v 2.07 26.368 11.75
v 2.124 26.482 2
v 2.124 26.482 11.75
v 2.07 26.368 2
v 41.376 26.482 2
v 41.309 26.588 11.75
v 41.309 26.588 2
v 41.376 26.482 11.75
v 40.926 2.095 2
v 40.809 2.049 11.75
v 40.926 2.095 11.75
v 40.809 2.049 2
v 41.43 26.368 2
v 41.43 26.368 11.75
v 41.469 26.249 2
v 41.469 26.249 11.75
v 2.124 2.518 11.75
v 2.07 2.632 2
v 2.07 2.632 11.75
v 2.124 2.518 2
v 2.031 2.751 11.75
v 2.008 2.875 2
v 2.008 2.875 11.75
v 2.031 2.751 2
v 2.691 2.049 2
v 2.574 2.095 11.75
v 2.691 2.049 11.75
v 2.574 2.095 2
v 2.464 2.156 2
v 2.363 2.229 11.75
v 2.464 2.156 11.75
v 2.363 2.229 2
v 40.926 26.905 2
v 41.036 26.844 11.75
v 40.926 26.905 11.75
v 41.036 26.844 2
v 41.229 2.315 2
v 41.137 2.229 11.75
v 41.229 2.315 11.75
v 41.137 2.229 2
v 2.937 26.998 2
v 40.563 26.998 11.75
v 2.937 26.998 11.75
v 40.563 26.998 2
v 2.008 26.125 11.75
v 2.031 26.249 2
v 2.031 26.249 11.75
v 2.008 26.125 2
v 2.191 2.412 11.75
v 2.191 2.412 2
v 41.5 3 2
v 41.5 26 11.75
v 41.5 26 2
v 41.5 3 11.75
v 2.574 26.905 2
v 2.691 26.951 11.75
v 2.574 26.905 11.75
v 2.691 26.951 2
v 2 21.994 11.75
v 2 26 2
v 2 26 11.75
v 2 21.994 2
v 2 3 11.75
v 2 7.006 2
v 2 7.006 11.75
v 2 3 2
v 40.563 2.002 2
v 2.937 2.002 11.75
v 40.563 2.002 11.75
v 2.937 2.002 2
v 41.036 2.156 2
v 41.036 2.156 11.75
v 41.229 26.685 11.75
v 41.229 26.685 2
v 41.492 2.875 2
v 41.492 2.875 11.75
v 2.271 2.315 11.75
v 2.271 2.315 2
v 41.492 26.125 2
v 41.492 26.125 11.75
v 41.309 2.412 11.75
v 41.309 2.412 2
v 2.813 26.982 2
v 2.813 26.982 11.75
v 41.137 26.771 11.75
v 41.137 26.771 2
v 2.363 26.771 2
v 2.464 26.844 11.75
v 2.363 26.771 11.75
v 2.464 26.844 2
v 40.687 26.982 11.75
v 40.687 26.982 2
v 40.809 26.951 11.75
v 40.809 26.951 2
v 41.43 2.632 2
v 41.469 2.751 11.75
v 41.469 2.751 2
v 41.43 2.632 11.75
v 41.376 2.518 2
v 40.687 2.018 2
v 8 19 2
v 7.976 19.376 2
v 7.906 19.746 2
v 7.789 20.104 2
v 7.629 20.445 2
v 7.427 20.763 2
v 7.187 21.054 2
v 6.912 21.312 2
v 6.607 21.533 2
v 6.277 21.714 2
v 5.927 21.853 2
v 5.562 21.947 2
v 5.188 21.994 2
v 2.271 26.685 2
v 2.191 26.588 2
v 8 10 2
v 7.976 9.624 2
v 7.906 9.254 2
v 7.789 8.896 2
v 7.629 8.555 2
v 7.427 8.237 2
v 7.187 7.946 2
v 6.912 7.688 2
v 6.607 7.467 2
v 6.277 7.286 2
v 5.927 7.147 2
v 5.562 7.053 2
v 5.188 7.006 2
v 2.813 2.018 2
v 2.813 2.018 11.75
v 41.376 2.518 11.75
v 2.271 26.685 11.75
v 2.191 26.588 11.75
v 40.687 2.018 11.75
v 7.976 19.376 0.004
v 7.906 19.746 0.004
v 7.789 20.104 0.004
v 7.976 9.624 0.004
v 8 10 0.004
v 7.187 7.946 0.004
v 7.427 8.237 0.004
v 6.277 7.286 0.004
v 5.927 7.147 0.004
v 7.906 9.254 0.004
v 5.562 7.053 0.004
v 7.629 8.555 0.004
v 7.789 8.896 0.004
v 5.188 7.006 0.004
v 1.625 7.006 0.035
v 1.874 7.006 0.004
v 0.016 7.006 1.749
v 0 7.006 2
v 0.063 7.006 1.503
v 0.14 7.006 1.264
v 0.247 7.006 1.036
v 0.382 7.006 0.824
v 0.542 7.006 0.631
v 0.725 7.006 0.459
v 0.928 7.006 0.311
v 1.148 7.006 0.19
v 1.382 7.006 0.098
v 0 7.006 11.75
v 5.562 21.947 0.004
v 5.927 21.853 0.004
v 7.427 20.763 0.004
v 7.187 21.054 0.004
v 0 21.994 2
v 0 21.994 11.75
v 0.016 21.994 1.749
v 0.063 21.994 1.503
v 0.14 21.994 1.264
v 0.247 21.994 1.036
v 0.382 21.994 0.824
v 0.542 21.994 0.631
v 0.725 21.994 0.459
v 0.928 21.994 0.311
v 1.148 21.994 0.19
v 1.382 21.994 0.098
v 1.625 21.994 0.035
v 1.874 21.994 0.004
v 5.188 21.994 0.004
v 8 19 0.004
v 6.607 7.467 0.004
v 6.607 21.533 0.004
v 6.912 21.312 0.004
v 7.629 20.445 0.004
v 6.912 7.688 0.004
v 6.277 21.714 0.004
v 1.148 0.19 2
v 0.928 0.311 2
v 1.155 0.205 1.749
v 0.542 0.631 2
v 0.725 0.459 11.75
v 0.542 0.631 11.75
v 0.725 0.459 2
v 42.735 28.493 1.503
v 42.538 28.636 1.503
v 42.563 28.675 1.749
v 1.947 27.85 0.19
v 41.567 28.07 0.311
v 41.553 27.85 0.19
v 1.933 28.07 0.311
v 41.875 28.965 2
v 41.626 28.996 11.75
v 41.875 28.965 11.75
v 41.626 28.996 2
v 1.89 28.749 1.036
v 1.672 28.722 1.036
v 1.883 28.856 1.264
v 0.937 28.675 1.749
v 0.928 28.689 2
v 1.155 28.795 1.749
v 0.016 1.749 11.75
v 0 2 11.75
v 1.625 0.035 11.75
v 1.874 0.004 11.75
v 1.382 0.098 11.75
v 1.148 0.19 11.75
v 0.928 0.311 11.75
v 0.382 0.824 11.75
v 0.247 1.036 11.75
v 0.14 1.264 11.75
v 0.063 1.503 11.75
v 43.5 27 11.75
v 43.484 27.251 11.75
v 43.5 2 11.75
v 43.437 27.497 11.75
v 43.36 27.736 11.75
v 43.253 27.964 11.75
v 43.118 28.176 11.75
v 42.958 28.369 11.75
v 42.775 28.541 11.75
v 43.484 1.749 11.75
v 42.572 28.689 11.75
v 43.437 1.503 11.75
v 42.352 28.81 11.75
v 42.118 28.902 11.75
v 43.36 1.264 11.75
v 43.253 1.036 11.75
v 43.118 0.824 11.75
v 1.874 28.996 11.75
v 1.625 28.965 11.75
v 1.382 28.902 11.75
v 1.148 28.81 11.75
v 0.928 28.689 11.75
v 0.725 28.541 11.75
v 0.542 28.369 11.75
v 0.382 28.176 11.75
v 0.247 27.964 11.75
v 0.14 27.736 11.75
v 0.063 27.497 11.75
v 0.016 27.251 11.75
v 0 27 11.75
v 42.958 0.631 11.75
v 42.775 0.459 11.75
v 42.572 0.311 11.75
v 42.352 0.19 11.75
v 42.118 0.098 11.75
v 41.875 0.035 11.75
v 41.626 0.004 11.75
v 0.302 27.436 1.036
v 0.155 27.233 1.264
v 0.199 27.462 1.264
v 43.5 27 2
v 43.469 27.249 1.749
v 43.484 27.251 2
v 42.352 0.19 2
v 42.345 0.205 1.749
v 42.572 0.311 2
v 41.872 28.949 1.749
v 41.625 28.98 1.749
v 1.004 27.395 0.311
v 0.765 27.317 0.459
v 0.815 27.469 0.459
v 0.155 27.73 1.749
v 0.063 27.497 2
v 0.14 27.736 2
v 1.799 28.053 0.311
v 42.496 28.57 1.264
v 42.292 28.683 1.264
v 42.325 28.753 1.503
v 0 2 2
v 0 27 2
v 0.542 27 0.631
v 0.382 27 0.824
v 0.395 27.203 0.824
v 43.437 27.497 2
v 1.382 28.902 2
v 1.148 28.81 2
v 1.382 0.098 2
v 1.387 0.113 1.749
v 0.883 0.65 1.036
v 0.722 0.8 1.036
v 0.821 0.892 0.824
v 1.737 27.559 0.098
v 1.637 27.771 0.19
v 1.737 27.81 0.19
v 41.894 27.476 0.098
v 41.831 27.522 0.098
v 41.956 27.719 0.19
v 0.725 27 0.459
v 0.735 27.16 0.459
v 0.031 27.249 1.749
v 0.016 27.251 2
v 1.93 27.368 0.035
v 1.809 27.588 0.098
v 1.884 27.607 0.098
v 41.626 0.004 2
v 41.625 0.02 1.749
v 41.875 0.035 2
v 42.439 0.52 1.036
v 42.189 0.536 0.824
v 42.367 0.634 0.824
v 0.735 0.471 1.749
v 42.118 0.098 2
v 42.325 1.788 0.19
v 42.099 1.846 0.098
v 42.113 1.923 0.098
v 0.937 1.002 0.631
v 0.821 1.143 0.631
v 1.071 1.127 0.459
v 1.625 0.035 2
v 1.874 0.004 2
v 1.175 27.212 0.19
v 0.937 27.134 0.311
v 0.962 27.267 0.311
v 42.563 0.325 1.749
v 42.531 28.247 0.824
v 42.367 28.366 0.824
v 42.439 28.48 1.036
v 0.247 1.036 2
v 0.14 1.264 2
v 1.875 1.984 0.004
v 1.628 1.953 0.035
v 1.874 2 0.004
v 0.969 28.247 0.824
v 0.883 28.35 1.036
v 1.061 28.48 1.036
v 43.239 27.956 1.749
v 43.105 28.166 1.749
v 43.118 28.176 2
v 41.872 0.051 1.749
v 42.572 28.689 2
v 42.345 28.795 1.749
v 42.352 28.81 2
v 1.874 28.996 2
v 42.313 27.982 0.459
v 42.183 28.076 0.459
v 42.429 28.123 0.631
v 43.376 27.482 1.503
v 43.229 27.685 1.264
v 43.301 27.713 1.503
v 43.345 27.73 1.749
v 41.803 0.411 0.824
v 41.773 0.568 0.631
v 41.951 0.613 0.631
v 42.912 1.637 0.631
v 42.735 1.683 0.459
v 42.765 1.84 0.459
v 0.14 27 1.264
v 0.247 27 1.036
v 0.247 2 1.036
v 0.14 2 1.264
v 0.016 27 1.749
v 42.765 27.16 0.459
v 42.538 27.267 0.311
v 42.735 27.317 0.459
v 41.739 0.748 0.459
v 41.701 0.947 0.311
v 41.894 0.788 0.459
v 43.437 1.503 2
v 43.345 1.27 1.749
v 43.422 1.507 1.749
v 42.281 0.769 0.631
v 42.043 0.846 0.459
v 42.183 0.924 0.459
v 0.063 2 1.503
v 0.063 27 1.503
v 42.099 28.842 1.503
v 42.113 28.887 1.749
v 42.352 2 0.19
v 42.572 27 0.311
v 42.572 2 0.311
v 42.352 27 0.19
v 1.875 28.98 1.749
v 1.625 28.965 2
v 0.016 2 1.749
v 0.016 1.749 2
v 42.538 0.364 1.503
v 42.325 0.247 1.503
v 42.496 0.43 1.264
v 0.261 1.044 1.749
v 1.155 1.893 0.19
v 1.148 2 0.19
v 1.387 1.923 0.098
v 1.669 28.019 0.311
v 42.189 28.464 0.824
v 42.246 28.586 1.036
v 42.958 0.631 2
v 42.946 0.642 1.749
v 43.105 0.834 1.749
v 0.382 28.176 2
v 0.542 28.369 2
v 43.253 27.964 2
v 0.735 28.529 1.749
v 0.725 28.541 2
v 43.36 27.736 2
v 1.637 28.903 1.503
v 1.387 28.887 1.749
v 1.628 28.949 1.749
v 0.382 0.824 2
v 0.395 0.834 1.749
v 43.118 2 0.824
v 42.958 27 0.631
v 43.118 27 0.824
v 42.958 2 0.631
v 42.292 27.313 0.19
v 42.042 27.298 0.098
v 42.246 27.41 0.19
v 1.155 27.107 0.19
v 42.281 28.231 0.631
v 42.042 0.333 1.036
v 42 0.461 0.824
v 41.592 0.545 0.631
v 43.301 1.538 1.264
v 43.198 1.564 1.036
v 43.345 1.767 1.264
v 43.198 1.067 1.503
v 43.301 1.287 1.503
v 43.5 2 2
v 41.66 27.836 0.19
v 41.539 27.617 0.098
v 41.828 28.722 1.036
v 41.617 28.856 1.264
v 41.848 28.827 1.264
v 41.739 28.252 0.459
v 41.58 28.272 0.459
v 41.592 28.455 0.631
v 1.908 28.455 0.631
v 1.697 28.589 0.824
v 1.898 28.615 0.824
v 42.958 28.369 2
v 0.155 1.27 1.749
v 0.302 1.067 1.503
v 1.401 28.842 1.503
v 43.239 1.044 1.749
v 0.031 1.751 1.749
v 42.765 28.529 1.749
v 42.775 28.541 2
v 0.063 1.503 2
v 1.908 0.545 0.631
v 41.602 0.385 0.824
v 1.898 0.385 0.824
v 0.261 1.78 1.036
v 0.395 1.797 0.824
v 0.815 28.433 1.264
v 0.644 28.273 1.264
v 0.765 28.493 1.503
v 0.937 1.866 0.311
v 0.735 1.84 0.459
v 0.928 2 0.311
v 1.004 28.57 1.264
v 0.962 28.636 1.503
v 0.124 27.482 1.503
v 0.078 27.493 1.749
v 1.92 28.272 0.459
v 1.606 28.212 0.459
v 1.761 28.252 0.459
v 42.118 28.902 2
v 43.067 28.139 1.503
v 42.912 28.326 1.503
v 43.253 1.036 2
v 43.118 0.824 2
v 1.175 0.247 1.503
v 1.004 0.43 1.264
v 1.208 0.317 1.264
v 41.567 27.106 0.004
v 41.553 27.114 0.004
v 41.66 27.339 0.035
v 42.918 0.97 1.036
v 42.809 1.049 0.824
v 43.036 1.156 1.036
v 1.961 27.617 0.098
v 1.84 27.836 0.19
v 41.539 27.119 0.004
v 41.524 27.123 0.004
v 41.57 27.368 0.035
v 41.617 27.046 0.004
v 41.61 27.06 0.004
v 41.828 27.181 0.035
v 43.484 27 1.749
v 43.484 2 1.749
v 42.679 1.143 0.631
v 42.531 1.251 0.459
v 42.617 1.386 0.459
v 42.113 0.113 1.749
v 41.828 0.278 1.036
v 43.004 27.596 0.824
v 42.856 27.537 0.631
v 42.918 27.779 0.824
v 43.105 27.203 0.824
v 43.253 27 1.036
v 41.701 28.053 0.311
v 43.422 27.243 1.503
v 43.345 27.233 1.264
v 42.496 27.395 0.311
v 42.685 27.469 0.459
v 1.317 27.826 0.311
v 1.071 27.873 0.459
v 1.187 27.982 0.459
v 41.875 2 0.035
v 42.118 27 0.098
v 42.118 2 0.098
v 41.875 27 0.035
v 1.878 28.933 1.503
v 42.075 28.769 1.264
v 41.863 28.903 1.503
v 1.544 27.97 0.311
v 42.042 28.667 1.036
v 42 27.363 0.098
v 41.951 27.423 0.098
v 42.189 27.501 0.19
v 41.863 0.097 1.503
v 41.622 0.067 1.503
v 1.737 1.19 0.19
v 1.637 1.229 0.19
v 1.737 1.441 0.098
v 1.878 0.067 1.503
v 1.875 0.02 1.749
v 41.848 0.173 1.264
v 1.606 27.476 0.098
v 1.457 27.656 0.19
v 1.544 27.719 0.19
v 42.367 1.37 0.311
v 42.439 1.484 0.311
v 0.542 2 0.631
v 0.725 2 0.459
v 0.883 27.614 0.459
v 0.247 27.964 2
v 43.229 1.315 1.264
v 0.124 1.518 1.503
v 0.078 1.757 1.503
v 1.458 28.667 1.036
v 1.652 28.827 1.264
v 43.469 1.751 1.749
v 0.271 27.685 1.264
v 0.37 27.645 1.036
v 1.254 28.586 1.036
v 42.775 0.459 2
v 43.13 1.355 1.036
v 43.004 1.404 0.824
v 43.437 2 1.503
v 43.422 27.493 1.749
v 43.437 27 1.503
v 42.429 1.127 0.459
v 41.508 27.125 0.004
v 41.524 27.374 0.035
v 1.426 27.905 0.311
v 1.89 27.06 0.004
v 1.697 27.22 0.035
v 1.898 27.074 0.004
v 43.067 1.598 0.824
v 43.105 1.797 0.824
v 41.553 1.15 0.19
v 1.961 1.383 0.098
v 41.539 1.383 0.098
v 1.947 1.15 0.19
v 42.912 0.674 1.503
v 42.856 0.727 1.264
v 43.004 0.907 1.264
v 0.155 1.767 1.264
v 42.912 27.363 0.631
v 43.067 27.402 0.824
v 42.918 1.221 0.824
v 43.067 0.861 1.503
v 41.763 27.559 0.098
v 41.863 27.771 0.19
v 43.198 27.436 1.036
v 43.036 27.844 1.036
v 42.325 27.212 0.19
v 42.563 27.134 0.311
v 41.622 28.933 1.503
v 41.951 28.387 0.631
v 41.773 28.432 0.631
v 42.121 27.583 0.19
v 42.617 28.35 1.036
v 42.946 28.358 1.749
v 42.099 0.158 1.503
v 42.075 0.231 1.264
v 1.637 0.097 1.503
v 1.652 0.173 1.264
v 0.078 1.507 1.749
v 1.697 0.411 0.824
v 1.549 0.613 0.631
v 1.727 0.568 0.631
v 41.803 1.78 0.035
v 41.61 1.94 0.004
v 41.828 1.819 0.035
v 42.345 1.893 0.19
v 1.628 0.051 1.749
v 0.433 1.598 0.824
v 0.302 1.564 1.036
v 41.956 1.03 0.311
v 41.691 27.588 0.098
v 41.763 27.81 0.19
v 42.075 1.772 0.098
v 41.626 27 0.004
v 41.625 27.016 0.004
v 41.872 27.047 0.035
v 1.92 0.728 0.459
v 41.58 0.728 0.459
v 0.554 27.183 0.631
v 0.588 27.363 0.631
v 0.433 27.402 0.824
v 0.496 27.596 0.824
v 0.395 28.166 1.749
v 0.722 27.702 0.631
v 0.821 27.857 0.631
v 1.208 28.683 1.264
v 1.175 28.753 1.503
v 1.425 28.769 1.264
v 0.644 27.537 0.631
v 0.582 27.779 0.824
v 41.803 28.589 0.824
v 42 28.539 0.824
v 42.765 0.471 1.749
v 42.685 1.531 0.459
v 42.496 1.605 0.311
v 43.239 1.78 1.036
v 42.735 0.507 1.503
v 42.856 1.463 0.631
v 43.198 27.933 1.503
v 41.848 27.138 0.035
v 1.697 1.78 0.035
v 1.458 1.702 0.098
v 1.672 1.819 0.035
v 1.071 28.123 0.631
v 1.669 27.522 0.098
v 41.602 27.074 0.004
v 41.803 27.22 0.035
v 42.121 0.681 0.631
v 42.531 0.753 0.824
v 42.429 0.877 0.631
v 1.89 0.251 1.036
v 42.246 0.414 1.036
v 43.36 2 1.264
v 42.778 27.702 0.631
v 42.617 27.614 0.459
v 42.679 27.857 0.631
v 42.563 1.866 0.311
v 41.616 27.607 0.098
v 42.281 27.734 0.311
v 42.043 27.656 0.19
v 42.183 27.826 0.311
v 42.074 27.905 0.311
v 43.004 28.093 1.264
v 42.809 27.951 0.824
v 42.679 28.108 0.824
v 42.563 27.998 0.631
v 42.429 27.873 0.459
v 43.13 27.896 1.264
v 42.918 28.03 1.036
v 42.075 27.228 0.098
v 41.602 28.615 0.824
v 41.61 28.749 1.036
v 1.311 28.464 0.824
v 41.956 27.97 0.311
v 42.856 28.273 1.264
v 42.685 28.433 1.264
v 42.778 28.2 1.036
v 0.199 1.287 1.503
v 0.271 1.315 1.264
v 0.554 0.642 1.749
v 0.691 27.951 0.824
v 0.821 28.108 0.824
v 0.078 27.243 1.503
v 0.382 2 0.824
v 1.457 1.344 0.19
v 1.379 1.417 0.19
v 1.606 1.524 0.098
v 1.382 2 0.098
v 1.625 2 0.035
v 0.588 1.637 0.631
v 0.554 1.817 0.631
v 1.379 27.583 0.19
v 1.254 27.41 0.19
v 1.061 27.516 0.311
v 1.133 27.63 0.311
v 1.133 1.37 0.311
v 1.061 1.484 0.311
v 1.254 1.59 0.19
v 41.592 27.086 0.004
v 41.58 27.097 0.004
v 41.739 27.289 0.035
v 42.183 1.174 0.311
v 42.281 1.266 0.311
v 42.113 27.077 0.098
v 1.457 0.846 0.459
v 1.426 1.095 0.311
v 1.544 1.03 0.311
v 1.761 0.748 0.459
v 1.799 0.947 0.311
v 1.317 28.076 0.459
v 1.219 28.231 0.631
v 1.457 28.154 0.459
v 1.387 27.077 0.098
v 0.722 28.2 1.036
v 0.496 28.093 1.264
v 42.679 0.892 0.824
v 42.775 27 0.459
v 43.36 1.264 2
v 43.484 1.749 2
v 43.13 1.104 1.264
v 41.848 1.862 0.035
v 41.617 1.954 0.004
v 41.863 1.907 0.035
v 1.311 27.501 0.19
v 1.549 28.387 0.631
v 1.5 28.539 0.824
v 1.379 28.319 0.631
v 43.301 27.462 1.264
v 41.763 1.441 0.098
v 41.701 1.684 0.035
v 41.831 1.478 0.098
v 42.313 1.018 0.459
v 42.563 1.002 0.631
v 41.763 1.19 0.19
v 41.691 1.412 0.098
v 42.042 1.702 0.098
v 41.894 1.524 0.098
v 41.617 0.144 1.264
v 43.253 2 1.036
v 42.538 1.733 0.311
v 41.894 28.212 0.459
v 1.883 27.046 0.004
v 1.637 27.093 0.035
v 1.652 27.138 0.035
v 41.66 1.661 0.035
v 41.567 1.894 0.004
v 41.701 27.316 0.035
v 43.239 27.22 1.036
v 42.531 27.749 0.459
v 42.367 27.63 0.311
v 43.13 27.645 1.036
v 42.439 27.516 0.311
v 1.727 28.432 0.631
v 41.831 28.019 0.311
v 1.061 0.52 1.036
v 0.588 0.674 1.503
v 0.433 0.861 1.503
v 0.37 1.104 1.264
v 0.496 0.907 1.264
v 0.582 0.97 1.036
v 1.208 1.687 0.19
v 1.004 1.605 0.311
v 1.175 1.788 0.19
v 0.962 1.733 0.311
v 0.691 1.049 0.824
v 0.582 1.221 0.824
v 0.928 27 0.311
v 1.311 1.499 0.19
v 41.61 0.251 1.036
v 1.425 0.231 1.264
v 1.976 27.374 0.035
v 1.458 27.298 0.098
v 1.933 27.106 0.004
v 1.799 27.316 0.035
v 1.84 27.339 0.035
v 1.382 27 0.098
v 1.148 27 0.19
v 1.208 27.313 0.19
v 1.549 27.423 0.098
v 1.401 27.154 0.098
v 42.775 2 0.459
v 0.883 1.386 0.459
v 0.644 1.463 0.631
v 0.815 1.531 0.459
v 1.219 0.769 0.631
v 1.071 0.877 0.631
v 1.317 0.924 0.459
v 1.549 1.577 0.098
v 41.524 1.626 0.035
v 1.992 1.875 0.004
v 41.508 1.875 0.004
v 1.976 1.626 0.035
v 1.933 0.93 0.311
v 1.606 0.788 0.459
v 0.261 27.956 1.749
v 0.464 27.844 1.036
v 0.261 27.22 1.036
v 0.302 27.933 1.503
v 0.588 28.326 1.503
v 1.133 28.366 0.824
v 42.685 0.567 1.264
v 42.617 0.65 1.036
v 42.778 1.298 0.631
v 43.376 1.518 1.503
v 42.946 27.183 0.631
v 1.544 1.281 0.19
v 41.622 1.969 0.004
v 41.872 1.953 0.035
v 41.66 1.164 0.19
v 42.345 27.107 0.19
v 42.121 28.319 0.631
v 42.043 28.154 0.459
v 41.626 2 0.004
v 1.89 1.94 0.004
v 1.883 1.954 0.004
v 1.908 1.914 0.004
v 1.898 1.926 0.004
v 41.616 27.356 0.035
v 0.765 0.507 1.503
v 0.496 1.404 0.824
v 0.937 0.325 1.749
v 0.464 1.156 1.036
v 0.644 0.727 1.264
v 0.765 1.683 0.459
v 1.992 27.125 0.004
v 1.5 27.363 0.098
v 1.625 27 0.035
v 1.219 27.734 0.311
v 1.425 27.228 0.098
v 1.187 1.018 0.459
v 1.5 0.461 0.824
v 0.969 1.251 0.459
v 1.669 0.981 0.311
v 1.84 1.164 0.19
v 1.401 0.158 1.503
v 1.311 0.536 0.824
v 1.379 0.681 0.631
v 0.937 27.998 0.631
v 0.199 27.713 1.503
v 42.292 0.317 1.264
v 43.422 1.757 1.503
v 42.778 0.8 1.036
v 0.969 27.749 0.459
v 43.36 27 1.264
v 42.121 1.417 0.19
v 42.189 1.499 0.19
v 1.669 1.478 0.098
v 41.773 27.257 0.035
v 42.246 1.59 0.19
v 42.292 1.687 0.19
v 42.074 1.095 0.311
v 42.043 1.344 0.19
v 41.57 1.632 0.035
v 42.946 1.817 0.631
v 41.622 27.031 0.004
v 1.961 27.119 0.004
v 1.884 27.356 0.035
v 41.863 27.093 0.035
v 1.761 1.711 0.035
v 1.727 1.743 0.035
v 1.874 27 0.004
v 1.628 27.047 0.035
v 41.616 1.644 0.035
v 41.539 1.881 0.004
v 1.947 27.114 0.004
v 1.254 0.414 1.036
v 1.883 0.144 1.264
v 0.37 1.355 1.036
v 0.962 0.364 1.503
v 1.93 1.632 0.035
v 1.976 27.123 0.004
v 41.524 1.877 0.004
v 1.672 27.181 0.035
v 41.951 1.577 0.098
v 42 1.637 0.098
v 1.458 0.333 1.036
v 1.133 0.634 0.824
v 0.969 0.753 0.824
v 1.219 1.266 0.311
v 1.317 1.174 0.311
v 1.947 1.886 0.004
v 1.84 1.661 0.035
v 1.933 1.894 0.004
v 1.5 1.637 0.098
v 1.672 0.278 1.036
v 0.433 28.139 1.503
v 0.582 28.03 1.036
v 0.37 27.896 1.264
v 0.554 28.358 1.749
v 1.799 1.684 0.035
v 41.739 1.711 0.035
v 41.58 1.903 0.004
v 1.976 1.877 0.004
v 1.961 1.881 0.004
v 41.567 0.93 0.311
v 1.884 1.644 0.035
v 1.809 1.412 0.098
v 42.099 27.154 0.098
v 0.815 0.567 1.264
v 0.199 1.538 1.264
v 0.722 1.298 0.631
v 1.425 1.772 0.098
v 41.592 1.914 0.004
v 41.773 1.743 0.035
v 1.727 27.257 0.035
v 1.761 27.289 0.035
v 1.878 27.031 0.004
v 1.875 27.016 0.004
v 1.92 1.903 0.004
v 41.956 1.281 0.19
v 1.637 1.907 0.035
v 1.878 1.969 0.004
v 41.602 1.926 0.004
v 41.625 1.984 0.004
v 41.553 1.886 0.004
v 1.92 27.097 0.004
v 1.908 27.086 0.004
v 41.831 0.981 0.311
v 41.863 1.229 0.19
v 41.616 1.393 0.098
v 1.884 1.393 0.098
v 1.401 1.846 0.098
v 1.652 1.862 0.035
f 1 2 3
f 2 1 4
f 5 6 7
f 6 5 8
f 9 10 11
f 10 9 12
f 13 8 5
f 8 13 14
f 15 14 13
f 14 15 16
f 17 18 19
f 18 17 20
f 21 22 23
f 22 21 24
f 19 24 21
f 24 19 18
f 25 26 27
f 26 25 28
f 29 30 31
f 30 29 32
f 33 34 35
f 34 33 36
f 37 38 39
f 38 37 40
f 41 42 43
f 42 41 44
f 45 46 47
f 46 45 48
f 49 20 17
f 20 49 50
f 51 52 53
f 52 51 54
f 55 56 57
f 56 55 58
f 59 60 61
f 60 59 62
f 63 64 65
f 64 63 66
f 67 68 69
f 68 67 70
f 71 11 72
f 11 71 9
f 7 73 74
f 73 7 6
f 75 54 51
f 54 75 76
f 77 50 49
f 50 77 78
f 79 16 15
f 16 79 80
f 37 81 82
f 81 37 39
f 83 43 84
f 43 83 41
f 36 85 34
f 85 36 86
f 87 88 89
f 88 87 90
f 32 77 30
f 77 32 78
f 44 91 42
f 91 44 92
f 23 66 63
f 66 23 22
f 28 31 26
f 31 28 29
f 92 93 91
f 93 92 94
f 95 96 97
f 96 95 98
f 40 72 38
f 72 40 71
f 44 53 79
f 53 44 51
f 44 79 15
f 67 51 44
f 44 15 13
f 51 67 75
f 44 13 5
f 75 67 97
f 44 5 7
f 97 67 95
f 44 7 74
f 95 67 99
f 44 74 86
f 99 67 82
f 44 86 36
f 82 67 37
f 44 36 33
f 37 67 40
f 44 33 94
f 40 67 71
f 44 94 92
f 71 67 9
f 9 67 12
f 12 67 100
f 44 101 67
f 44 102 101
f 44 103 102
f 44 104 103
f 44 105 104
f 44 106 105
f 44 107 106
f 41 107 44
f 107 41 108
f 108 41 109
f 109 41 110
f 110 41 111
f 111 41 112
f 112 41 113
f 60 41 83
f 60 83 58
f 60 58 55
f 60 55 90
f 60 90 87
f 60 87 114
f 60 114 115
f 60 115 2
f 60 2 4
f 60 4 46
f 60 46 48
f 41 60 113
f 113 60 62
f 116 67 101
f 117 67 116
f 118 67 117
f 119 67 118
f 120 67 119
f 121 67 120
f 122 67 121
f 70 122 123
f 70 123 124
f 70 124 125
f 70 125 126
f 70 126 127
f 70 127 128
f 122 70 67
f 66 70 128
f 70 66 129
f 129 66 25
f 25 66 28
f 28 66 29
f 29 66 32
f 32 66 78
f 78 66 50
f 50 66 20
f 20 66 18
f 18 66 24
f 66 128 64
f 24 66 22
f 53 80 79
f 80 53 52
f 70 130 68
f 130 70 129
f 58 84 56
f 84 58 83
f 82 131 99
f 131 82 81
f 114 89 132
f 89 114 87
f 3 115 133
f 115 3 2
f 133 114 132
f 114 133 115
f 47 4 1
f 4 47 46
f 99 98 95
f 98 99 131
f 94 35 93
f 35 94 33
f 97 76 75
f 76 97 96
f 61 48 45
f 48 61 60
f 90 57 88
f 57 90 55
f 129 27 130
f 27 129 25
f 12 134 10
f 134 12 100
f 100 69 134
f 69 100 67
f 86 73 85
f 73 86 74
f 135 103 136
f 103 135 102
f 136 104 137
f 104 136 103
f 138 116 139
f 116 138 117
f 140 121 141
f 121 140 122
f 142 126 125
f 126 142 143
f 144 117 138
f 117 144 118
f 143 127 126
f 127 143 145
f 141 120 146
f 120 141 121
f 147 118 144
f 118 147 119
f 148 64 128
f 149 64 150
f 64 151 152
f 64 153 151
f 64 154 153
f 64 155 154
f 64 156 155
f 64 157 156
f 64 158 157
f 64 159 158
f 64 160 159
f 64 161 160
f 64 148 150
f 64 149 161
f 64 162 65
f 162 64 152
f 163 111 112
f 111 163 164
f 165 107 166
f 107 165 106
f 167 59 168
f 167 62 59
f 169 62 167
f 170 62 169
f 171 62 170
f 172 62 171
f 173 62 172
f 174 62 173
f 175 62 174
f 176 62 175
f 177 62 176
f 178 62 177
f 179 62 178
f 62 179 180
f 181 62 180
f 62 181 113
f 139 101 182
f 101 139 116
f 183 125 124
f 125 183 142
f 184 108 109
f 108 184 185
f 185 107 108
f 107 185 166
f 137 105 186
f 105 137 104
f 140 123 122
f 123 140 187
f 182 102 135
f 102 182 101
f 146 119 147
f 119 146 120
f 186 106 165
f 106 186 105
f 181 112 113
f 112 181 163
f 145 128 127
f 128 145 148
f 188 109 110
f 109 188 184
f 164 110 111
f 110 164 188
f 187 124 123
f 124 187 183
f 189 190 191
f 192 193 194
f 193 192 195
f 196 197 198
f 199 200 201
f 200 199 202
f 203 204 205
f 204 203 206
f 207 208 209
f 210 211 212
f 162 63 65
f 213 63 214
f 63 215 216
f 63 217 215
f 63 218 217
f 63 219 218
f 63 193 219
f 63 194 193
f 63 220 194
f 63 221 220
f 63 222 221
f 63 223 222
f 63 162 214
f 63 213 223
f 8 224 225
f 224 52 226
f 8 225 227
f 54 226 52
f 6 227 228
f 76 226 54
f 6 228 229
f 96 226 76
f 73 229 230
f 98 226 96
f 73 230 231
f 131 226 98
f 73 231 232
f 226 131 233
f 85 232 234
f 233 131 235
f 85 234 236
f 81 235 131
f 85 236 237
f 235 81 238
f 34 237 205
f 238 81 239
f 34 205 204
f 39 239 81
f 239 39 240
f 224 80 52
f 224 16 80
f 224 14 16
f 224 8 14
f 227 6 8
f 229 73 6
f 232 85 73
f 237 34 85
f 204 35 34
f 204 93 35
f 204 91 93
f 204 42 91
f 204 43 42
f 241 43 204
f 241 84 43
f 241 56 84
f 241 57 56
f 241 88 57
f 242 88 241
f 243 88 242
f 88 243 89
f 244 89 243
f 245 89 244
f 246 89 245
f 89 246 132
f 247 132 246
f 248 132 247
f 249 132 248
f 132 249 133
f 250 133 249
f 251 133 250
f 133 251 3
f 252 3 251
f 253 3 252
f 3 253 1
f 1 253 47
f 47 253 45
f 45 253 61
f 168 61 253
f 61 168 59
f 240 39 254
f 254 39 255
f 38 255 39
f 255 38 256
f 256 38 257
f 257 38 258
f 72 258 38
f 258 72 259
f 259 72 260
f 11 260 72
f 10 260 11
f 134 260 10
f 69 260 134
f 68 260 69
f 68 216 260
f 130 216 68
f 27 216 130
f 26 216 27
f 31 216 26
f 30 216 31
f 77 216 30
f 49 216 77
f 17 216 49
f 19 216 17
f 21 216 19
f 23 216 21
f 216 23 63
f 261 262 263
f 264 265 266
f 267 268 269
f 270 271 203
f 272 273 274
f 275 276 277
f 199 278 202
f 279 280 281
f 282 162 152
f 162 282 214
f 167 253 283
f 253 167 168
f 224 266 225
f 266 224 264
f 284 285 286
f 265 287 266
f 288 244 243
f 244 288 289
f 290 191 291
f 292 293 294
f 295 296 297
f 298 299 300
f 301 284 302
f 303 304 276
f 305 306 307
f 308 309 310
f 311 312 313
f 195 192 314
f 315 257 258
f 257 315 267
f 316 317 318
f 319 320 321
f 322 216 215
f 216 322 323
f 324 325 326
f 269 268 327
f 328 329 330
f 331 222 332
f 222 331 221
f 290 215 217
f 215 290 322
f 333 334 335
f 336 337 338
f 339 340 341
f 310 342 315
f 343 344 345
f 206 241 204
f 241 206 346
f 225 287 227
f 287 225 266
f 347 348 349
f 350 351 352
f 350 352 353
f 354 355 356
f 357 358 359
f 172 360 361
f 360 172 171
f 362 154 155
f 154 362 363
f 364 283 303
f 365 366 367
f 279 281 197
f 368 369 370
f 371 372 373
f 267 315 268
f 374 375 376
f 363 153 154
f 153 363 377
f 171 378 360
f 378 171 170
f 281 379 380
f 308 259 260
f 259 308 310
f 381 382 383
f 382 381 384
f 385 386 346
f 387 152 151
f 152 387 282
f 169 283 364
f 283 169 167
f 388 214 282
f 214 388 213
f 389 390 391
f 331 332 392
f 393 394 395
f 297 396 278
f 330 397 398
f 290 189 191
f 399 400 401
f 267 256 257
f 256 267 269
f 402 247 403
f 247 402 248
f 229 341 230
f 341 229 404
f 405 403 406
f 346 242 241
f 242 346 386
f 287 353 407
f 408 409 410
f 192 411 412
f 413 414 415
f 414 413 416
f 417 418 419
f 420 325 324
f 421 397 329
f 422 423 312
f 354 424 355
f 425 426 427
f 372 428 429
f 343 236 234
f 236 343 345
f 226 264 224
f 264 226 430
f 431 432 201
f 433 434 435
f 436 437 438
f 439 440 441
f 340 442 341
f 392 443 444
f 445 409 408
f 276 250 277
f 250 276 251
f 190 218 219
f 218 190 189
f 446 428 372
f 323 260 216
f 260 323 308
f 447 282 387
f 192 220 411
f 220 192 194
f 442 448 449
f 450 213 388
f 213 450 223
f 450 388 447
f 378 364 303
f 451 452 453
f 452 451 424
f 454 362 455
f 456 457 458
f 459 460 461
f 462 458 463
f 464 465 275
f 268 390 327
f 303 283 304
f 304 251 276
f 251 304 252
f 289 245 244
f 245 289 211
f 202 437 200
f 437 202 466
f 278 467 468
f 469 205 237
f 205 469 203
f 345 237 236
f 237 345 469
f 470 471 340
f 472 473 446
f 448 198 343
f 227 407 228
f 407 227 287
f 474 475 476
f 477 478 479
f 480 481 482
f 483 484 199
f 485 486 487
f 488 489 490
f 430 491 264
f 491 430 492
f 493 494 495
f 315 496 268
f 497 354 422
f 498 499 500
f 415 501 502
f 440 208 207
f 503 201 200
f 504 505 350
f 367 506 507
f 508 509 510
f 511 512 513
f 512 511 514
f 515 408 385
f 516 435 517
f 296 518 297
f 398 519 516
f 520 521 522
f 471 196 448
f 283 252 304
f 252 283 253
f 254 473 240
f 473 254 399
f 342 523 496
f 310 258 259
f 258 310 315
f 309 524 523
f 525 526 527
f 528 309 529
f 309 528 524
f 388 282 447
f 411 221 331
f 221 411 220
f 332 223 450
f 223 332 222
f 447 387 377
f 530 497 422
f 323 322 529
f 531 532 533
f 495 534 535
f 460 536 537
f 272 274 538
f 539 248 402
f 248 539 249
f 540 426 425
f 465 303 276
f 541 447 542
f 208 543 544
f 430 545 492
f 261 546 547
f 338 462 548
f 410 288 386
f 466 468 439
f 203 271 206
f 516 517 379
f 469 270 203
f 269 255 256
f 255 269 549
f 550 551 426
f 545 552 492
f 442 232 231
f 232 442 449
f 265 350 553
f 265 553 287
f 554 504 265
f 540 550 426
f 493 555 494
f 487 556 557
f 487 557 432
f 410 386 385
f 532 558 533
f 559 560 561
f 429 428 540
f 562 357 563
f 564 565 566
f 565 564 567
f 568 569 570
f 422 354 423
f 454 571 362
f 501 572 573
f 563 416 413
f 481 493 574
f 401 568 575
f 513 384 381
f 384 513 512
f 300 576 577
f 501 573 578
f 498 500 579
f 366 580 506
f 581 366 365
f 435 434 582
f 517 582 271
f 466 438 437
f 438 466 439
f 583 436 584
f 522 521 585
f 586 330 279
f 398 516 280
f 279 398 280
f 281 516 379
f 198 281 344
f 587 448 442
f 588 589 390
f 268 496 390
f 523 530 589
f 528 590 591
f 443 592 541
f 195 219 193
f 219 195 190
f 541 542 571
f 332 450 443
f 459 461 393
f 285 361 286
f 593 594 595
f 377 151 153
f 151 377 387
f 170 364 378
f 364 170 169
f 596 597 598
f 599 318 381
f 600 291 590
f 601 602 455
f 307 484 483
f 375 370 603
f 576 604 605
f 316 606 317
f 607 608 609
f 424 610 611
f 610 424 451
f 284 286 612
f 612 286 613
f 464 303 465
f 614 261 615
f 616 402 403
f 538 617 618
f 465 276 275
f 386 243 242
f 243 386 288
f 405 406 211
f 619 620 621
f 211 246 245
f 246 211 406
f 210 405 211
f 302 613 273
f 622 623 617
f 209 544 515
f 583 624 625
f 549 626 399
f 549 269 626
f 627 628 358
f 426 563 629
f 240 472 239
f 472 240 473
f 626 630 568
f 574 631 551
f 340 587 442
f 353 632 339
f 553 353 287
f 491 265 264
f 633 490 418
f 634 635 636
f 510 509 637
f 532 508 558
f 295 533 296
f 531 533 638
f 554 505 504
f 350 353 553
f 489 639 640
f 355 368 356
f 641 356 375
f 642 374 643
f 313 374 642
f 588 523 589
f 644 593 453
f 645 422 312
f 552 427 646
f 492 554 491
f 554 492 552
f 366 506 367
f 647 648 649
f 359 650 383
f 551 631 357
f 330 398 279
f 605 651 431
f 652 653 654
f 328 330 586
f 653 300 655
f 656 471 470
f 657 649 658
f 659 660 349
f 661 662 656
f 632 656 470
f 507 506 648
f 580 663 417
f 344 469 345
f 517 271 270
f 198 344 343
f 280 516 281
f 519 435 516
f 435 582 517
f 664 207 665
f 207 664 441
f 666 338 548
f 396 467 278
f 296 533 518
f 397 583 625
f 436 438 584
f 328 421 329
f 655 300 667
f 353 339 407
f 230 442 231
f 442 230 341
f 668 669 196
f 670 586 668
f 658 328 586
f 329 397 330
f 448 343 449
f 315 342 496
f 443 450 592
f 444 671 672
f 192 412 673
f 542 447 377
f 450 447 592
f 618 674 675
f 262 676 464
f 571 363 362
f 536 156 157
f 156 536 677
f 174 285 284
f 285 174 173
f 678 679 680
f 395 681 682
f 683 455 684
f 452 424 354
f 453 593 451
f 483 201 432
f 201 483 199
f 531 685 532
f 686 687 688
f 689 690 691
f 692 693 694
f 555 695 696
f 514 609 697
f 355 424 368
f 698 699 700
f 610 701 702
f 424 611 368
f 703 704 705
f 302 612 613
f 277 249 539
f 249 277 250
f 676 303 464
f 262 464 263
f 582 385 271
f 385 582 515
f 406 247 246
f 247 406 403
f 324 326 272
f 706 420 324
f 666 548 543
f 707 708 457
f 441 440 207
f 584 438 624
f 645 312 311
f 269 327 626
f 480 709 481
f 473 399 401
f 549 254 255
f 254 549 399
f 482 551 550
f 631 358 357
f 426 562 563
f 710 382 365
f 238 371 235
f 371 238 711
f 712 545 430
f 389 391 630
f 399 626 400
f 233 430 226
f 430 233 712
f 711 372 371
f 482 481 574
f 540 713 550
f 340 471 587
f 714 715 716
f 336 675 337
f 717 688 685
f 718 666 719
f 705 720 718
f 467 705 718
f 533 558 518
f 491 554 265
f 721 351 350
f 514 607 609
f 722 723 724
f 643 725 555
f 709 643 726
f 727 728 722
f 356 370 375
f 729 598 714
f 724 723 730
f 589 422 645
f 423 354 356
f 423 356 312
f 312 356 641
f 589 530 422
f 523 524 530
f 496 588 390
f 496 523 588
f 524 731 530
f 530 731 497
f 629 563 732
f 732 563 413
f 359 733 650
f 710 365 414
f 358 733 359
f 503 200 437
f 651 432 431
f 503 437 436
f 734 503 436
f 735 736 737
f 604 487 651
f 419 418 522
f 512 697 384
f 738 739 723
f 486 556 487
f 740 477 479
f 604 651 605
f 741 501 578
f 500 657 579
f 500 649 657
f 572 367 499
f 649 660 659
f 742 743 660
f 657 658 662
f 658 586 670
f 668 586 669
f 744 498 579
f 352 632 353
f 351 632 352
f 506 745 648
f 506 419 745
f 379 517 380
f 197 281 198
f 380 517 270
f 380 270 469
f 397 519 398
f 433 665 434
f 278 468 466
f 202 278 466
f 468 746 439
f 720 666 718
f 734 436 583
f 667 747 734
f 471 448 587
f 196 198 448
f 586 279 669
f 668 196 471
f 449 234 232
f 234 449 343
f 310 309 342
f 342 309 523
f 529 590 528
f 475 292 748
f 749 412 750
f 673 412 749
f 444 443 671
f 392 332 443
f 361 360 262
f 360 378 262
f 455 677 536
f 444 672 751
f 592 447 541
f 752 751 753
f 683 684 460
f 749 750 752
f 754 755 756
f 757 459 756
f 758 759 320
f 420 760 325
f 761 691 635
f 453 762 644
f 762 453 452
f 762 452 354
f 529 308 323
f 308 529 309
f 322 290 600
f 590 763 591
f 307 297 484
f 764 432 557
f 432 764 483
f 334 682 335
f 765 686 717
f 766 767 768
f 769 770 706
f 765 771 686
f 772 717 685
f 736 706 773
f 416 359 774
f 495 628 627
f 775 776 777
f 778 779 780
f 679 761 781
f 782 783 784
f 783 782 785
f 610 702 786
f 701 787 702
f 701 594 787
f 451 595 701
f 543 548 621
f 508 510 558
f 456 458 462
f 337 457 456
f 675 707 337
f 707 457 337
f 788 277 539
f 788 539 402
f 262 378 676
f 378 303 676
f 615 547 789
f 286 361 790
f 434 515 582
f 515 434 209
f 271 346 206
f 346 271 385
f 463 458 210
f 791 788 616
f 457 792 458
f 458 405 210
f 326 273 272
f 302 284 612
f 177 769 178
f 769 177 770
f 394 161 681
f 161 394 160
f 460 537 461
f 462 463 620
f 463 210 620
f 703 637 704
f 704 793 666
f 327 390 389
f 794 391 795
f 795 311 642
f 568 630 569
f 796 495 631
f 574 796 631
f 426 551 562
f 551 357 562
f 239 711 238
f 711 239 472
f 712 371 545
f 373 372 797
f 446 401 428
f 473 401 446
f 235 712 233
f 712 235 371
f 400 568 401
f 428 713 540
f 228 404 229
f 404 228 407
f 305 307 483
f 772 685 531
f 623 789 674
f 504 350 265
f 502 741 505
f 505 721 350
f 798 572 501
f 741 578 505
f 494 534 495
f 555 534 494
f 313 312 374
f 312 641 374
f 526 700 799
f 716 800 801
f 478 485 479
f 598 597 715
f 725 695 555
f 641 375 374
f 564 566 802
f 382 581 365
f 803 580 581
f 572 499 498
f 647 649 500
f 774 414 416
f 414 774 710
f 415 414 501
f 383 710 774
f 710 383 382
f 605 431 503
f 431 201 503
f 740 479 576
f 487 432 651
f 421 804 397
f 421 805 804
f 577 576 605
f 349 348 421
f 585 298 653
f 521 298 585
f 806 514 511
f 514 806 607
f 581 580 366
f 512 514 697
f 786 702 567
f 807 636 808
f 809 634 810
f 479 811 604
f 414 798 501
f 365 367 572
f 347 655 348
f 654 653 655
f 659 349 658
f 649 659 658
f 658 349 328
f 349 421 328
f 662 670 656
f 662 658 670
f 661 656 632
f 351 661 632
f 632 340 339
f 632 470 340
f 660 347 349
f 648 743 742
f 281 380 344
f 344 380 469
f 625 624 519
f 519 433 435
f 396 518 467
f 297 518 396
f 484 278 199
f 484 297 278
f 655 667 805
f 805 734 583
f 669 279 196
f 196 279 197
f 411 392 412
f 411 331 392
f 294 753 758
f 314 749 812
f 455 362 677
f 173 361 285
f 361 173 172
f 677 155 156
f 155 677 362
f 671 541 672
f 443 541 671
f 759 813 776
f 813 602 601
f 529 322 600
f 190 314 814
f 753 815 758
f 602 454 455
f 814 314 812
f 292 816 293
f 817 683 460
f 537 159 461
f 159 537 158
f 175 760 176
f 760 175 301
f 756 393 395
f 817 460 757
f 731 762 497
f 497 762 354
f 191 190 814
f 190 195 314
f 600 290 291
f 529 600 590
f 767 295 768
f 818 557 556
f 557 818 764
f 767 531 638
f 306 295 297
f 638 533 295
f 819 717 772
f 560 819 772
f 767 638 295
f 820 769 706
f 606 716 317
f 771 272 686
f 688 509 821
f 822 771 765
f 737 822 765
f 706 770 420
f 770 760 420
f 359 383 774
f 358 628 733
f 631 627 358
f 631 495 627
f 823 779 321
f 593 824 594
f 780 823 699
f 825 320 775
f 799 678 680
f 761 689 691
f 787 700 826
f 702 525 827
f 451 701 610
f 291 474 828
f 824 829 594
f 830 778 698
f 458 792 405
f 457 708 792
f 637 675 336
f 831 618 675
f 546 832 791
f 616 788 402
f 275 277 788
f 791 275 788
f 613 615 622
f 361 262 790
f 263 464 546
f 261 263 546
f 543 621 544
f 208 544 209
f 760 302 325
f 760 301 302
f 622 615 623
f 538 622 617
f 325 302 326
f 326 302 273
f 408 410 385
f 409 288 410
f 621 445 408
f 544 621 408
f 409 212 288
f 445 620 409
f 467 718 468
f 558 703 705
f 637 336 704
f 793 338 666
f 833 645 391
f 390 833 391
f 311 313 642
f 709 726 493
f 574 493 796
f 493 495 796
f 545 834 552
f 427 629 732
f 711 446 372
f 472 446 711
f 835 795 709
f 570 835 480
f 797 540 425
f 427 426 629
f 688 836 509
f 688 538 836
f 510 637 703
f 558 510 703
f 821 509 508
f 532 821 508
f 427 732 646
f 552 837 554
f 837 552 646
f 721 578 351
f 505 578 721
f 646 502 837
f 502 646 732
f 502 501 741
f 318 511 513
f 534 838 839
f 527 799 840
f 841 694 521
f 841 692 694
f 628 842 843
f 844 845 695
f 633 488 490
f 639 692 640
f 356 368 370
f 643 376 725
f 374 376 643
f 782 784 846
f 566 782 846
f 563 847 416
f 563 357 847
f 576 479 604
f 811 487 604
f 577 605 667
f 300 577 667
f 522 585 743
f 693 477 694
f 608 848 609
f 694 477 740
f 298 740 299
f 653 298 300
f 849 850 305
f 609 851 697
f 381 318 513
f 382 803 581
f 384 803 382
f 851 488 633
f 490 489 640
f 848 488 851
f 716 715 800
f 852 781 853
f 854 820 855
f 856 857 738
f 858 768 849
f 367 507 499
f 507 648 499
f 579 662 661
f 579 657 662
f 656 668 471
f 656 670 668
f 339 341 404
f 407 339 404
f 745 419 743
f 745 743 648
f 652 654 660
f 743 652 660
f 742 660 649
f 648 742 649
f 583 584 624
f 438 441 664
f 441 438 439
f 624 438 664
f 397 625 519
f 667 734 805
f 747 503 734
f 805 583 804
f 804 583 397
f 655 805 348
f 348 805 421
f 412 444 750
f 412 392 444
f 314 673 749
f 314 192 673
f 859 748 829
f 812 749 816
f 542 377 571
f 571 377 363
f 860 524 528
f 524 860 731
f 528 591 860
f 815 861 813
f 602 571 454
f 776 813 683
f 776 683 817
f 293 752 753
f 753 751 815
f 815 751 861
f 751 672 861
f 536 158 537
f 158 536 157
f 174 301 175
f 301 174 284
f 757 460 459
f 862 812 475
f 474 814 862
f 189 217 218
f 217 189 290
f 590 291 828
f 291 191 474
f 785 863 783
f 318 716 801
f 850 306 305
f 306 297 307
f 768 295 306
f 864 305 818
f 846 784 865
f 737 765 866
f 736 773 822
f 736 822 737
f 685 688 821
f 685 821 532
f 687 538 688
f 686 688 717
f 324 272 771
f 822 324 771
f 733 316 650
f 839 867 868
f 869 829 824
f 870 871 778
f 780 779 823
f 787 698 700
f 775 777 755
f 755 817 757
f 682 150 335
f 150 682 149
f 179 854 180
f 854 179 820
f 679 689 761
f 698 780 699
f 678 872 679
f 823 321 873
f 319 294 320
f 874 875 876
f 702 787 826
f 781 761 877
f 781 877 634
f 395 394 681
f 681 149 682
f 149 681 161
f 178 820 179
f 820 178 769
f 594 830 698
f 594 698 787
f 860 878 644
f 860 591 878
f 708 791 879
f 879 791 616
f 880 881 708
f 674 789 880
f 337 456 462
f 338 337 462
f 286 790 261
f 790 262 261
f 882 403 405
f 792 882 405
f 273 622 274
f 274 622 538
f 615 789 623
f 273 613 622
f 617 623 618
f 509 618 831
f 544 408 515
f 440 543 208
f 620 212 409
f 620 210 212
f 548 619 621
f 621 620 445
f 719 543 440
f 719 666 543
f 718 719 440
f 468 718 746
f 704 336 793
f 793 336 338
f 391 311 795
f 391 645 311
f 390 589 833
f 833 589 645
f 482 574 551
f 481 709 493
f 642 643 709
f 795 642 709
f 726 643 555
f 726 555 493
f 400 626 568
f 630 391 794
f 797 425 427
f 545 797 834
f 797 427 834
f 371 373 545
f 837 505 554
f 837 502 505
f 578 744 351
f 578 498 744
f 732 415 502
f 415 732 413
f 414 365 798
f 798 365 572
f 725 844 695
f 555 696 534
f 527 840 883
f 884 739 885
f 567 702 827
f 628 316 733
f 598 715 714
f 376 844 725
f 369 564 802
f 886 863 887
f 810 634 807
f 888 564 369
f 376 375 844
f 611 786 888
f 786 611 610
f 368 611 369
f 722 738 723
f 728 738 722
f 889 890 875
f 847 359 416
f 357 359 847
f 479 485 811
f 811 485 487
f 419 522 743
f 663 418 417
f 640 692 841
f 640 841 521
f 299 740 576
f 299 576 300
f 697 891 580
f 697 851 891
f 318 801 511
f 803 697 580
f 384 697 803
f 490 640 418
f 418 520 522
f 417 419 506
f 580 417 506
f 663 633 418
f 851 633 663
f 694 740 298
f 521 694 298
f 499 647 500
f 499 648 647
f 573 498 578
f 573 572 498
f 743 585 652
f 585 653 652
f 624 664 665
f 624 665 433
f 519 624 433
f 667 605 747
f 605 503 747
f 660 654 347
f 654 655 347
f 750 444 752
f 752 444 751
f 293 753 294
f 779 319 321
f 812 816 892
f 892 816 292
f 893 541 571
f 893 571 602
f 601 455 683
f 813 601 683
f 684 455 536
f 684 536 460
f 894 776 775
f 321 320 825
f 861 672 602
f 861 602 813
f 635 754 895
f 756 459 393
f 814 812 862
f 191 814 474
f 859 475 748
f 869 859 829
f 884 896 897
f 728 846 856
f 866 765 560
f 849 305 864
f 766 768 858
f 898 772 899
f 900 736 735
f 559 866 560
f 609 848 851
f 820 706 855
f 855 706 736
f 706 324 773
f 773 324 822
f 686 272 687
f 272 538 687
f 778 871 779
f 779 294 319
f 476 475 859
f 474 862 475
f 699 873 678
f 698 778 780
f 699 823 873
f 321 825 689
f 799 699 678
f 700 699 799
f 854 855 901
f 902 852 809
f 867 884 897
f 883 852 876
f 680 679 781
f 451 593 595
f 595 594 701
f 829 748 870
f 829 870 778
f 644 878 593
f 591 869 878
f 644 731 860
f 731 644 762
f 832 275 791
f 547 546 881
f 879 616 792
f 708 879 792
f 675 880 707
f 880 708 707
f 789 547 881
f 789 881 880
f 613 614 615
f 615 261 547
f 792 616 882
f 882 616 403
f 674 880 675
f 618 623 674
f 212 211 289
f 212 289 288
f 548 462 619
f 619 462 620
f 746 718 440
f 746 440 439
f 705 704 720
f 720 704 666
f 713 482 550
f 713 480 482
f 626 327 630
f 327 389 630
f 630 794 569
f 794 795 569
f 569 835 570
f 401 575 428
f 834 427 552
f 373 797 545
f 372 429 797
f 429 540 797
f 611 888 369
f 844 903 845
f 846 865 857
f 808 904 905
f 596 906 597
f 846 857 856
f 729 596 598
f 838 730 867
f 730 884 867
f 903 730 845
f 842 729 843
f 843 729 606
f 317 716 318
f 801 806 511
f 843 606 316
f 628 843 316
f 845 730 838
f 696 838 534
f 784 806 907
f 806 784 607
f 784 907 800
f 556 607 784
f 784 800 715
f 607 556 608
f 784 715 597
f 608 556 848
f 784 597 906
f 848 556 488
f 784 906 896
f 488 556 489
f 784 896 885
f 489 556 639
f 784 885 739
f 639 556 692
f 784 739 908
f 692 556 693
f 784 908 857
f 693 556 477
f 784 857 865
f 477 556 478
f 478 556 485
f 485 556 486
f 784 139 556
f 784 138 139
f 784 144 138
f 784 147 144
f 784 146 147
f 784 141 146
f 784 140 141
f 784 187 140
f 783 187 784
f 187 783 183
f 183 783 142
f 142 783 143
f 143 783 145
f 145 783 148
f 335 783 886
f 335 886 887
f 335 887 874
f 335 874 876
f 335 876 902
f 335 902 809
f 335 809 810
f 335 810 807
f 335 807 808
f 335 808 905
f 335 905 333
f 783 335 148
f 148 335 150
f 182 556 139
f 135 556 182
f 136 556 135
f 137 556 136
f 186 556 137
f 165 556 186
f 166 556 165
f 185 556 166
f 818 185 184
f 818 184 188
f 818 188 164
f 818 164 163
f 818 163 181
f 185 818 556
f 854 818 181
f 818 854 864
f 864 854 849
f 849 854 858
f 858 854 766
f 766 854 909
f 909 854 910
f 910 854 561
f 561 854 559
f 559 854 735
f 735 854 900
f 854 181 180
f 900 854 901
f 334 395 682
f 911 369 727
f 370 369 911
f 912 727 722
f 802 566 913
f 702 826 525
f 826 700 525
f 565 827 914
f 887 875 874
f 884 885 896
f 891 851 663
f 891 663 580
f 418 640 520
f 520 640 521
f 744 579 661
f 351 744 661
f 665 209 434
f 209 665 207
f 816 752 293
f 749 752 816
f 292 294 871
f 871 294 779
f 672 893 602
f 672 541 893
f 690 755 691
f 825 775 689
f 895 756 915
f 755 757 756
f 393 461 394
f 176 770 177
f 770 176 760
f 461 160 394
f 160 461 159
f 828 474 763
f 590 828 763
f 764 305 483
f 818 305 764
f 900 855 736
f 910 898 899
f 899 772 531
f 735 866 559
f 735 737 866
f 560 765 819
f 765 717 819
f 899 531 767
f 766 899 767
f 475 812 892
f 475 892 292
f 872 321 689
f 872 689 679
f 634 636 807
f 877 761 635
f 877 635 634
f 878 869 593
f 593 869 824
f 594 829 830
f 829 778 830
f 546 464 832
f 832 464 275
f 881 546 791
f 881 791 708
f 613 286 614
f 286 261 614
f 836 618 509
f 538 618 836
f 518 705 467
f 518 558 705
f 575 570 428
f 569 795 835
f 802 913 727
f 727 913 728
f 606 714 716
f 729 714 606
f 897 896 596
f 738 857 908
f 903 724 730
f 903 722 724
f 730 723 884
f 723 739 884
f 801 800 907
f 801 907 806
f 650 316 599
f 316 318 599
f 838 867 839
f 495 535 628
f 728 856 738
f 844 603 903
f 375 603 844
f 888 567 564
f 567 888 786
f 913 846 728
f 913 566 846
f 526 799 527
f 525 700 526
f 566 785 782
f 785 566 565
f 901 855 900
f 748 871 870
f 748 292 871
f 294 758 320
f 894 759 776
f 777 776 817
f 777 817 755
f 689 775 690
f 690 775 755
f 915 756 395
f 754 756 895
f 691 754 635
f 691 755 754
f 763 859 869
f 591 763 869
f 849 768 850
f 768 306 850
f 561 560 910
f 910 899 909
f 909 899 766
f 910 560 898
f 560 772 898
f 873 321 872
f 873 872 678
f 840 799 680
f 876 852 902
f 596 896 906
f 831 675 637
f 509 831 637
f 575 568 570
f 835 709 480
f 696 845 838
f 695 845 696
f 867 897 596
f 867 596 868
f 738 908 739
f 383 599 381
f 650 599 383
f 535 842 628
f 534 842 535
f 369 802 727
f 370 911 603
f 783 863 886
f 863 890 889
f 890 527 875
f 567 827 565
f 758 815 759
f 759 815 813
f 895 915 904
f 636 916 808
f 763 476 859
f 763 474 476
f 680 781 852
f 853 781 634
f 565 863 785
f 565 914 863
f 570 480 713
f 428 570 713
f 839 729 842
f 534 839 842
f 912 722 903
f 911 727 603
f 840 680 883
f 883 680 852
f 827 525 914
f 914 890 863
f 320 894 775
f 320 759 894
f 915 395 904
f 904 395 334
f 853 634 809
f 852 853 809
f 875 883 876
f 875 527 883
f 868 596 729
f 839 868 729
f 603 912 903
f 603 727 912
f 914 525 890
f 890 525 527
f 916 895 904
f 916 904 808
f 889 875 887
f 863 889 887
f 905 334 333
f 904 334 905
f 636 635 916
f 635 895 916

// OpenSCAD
// file: ../../lib/rounded_square.scad
$bleed = 1;
$rounding = 3;

module rounded_square(size, flat_top=false, flat_bottom=false) {
  assert(!(flat_top && flat_bottom), "Flat top and flat bottom are exclusive");

  rounding_height = flat_top || flat_bottom 
    ? $rounding 
    : $rounding * 2;

  offset = flat_bottom ? 0 : $rounding;

  inner_size = [
    size[0] - $rounding * 2,
    size[1] - rounding_height,
  ];

  minkowski() {
    translate([$rounding, offset]) {
      square(inner_size);
    }
    if (flat_top ) {
      difference() {
        circle($rounding);
        translate([-$rounding, 0]) {
          square([$rounding * 2, $rounding]);
        }
      }
    } else if (flat_bottom) {
      difference() {
        circle($rounding);
        translate([-$rounding, -$rounding]) {
          square([$rounding * 2, $rounding]);
        }
      }
    } else {
      circle($rounding);
    }
  }
}
// file: ../../lib/tile_tray.scad
include <./layout.scad>

$wall_thickness = 2;
$bleed = 0.01;
$padding = 0.5;
$inset = 6;
$cutout_fraction = 0.6;

// I have no idea why it needs to be this vaule
// Seems to be to do with how the cube handles rounding
magic_pill_number = 0.4;

function tile_rounding (size, pill=false) = pill ? min(size[0], size[1]) / 2  + magic_pill_number: 1;

module tile_cutout(
  tile_size, 
  count=1, 
  roof_height,
  left_cutout=false, 
  right_cutout=false,
  top_cutout=false,
  bottom_cutout=false,
  pill=false
) {
  // No need to render any cutout if the size is zero
  if (count > 0) {
    tray_size = [
      pad(tile_size[0]),
      pad(tile_size[1]),
      stack_height(tile_size[2], count) + $bleed,
    ];
  
    floor_height = roof_height - tray_size[2] + $bleed;
  
    translate([0, 0, floor_height]) {
      rounded_cube(tray_size, flat=true, $rounding=tile_rounding(tile_size, pill));
    }
    
    if (left_cutout) {
      left_cutout_size = [
        $inset * 2 + $wall_thickness,
        tray_size[1] * $cutout_fraction,
        roof_height + $bleed * 2,
      ];
  
      translate([-left_cutout_size[0] + $inset, (tray_size[1] - left_cutout_size[1]) / 2, 0]) {
        rounded_cube(left_cutout_size, flat=true);
      }
    }
  
    if (right_cutout) {
      right_cutout_size = [
        $inset * 2 + $wall_thickness,
        tray_size[1] * $cutout_fraction,
        roof_height + $bleed * 2,
      ];
  
      translate([tray_size[0] - $inset, (tray_size[1] - right_cutout_size[1]) / 2, 0]) {
        rounded_cube(right_cutout_size, flat=true);
      }
    }
  
    if (top_cutout) {
      top_cutout_size = [
        tray_size[0] * $cutout_fraction,
        $inset * 2 + $wall_thickness,
        roof_height + $bleed * 2,
      ];
  
      translate([
        (tray_size[0] - top_cutout_size[0]) / 2, 
        tray_size[1] + $wall_thickness - $inset,
        0
      ]) {
        rounded_cube(top_cutout_size, flat=true);
      }
    }
  
    if (bottom_cutout) {
      bottom_cutout_size = [
        tray_size[0] * $cutout_fraction,
        $inset * 2 + $wall_thickness,
        roof_height + $bleed * 2,
      ];
  
      translate([
        (tray_size[0] - bottom_cutout_size[0]) / 2, 
        0 - bottom_cutout_size[1] - $wall_thickness + $inset,
        0
      ]) {
        rounded_cube(bottom_cutout_size, flat=true);
      }
    }
  }
}
// file: ../../lib/layout.scad
$padding = 0.5;
$wall_thickness = 2;

function stack_height (size, count=1) = size * count + $padding;

function padded_offset (size, index=1) = (size + $padding * 2 + $wall_thickness) * index;

function offset (size, index=1) = (size + $wall_thickness) * index;

function pad (size) = size + $padding * 2;

module offset_cylinder(d, h) {
  translate([d / 2, d / 2, 0]) {
    cylinder(d=d, h=h);
  }
}

module offset_circle(d) {
  translate([d / 2, d / 2, 0]) {
    circle(d=d);
  }
}

module offset_square(size, center=false) {
  translate([size[0] / 2, size[1] / 2, 0]) {
    square(size, center=center);
  }
}
// file: ../../lib/rounded_cube.scad
include <./rounded_square.scad>

$bleed = 1;
$rounding = 3;

// Render a rounded cube
// flat_top: do not round the top edges
// flat_bottom: do not round the bottom edges
// flat: equals flat_top && flat_bottom
// 
// Limitations:
// requires height > $rounding * 2
// flat_top || flat_bottom requires height > $rounding
// flat_top && flat_bottom requires height > $bleed
module rounded_cube(
  size, 
  flat=false, 
  flat_top=false, 
  flat_bottom=false,
  side_rounding=-1
) {
  _flat_top = flat_top || flat;
  _flat_bottom = flat_bottom || flat;
  _side_rounding = side_rounding > -1 ? side_rounding: $rounding;

  top_height = _flat_top ? 0: $rounding;
  bottom_height = _flat_bottom ? 0: $rounding;

  cube_size = [
    size[0] - $rounding * 2,
    size[1] - $rounding * 2,
    size[2] - (top_height + bottom_height)
  ];

  if (_flat_top && _flat_bottom) {
     linear_extrude(cube_size[2]) {
       rounded_square([size[0], size[1]]);
     }
   } else {
     minkowski() {
       translate([$rounding, $rounding, bottom_height]) {
         if (_side_rounding != $rounding) {
           linear_extrude(cube_size[2]) {
             rounded_square([cube_size[0], cube_size[1]], $rounding=_side_rounding);
           }
         } else {
           cube(cube_size);
         }
       }
       if (_flat_top) {
         difference() {
           sphere($rounding);
           cylinder($rounding, $rounding, $rounding);
         }
       } else if (_flat_bottom) {
         difference() {
           sphere($rounding);
           translate ([0, 0, -$rounding]) {
             cylinder($rounding, $rounding, $rounding);
           }
         }
       } else {
         sphere($rounding);
       }
    }
  }
}
// main file
echo(version=version());

include <../../lib/rounded_cube.scad>
include <../../lib/layout.scad>
include <../../lib/tile_tray.scad>

// Config
$fn = 50;
// $fn = 10;

truck_6_size = [
  114,
  24,
  1.85
];

truck_5_size = [
  95,
  24,
  1.85
];

truck_4_size = [
  76,
  24,
  1.85
];

truck_3_size = [
  57.5,
  24,
  1.85
];

truck_2_size = [
  38.5,
  24,
  1.85
];

truck_count = 5;

module truck_tray() {
  box_size = [
    max(
      padded_offset(truck_6_size[0]),
      padded_offset(truck_5_size[0]) + padded_offset(truck_2_size[0]),
      padded_offset(truck_4_size[0]) + padded_offset(truck_3_size[0])
    ) + $wall_thickness,
    padded_offset(truck_6_size[1], 3) + $wall_thickness,
    stack_height(truck_6_size[2], truck_count) + $wall_thickness,
  ];
  
  difference() {
    rounded_cube(box_size, flat_top=true, $rounding=2);
  
    translate([$wall_thickness, $wall_thickness, 0]) {
      // Bottom row
      tile_cutout(
        truck_4_size, 
        truck_count, 
        roof_height=box_size[2],
        left_cutout=true
      );
      translate([padded_offset(truck_4_size[0]), 0, 0]) {
        tile_cutout(
          truck_3_size, 
          truck_count, 
          roof_height=box_size[2],
          right_cutout=true
        );
      }
  
      // Middle row
      translate([0, padded_offset(truck_6_size[1]), 0]) {
        tile_cutout(
          truck_5_size, 
          truck_count, 
          roof_height=box_size[2],
          left_cutout=true
        );
      }
      translate([padded_offset(truck_5_size[0]), padded_offset(truck_6_size[1]), 0]) {
        tile_cutout(
          truck_2_size, 
          truck_count, 
          roof_height=box_size[2],
          right_cutout=true
        );
      }
  
      // Top row
      translate([0, padded_offset(truck_6_size[1], 2), 0]) {
        tile_cutout(
          truck_6_size, 
          truck_count, 
          roof_height=box_size[2],
          left_cutout=true
        );
      }
    }
  }
}

module test_truck_tray() {
  box_size = [
    padded_offset(truck_2_size[0]) + $wall_thickness,
    padded_offset(truck_2_size[1]) + $wall_thickness,
    stack_height(truck_2_size[2], truck_count) + $wall_thickness,
  ];
  
  difference() {
    rounded_cube(box_size, flat_top=true, $rounding=2);
  
    translate([$wall_thickness, $wall_thickness, 0]) {
      tile_cutout(
        truck_2_size, 
        truck_count, 
        roof_height=box_size[2],
        left_cutout=true
      );
    }
  }
}

// truck_tray();
test_truck_tray();
